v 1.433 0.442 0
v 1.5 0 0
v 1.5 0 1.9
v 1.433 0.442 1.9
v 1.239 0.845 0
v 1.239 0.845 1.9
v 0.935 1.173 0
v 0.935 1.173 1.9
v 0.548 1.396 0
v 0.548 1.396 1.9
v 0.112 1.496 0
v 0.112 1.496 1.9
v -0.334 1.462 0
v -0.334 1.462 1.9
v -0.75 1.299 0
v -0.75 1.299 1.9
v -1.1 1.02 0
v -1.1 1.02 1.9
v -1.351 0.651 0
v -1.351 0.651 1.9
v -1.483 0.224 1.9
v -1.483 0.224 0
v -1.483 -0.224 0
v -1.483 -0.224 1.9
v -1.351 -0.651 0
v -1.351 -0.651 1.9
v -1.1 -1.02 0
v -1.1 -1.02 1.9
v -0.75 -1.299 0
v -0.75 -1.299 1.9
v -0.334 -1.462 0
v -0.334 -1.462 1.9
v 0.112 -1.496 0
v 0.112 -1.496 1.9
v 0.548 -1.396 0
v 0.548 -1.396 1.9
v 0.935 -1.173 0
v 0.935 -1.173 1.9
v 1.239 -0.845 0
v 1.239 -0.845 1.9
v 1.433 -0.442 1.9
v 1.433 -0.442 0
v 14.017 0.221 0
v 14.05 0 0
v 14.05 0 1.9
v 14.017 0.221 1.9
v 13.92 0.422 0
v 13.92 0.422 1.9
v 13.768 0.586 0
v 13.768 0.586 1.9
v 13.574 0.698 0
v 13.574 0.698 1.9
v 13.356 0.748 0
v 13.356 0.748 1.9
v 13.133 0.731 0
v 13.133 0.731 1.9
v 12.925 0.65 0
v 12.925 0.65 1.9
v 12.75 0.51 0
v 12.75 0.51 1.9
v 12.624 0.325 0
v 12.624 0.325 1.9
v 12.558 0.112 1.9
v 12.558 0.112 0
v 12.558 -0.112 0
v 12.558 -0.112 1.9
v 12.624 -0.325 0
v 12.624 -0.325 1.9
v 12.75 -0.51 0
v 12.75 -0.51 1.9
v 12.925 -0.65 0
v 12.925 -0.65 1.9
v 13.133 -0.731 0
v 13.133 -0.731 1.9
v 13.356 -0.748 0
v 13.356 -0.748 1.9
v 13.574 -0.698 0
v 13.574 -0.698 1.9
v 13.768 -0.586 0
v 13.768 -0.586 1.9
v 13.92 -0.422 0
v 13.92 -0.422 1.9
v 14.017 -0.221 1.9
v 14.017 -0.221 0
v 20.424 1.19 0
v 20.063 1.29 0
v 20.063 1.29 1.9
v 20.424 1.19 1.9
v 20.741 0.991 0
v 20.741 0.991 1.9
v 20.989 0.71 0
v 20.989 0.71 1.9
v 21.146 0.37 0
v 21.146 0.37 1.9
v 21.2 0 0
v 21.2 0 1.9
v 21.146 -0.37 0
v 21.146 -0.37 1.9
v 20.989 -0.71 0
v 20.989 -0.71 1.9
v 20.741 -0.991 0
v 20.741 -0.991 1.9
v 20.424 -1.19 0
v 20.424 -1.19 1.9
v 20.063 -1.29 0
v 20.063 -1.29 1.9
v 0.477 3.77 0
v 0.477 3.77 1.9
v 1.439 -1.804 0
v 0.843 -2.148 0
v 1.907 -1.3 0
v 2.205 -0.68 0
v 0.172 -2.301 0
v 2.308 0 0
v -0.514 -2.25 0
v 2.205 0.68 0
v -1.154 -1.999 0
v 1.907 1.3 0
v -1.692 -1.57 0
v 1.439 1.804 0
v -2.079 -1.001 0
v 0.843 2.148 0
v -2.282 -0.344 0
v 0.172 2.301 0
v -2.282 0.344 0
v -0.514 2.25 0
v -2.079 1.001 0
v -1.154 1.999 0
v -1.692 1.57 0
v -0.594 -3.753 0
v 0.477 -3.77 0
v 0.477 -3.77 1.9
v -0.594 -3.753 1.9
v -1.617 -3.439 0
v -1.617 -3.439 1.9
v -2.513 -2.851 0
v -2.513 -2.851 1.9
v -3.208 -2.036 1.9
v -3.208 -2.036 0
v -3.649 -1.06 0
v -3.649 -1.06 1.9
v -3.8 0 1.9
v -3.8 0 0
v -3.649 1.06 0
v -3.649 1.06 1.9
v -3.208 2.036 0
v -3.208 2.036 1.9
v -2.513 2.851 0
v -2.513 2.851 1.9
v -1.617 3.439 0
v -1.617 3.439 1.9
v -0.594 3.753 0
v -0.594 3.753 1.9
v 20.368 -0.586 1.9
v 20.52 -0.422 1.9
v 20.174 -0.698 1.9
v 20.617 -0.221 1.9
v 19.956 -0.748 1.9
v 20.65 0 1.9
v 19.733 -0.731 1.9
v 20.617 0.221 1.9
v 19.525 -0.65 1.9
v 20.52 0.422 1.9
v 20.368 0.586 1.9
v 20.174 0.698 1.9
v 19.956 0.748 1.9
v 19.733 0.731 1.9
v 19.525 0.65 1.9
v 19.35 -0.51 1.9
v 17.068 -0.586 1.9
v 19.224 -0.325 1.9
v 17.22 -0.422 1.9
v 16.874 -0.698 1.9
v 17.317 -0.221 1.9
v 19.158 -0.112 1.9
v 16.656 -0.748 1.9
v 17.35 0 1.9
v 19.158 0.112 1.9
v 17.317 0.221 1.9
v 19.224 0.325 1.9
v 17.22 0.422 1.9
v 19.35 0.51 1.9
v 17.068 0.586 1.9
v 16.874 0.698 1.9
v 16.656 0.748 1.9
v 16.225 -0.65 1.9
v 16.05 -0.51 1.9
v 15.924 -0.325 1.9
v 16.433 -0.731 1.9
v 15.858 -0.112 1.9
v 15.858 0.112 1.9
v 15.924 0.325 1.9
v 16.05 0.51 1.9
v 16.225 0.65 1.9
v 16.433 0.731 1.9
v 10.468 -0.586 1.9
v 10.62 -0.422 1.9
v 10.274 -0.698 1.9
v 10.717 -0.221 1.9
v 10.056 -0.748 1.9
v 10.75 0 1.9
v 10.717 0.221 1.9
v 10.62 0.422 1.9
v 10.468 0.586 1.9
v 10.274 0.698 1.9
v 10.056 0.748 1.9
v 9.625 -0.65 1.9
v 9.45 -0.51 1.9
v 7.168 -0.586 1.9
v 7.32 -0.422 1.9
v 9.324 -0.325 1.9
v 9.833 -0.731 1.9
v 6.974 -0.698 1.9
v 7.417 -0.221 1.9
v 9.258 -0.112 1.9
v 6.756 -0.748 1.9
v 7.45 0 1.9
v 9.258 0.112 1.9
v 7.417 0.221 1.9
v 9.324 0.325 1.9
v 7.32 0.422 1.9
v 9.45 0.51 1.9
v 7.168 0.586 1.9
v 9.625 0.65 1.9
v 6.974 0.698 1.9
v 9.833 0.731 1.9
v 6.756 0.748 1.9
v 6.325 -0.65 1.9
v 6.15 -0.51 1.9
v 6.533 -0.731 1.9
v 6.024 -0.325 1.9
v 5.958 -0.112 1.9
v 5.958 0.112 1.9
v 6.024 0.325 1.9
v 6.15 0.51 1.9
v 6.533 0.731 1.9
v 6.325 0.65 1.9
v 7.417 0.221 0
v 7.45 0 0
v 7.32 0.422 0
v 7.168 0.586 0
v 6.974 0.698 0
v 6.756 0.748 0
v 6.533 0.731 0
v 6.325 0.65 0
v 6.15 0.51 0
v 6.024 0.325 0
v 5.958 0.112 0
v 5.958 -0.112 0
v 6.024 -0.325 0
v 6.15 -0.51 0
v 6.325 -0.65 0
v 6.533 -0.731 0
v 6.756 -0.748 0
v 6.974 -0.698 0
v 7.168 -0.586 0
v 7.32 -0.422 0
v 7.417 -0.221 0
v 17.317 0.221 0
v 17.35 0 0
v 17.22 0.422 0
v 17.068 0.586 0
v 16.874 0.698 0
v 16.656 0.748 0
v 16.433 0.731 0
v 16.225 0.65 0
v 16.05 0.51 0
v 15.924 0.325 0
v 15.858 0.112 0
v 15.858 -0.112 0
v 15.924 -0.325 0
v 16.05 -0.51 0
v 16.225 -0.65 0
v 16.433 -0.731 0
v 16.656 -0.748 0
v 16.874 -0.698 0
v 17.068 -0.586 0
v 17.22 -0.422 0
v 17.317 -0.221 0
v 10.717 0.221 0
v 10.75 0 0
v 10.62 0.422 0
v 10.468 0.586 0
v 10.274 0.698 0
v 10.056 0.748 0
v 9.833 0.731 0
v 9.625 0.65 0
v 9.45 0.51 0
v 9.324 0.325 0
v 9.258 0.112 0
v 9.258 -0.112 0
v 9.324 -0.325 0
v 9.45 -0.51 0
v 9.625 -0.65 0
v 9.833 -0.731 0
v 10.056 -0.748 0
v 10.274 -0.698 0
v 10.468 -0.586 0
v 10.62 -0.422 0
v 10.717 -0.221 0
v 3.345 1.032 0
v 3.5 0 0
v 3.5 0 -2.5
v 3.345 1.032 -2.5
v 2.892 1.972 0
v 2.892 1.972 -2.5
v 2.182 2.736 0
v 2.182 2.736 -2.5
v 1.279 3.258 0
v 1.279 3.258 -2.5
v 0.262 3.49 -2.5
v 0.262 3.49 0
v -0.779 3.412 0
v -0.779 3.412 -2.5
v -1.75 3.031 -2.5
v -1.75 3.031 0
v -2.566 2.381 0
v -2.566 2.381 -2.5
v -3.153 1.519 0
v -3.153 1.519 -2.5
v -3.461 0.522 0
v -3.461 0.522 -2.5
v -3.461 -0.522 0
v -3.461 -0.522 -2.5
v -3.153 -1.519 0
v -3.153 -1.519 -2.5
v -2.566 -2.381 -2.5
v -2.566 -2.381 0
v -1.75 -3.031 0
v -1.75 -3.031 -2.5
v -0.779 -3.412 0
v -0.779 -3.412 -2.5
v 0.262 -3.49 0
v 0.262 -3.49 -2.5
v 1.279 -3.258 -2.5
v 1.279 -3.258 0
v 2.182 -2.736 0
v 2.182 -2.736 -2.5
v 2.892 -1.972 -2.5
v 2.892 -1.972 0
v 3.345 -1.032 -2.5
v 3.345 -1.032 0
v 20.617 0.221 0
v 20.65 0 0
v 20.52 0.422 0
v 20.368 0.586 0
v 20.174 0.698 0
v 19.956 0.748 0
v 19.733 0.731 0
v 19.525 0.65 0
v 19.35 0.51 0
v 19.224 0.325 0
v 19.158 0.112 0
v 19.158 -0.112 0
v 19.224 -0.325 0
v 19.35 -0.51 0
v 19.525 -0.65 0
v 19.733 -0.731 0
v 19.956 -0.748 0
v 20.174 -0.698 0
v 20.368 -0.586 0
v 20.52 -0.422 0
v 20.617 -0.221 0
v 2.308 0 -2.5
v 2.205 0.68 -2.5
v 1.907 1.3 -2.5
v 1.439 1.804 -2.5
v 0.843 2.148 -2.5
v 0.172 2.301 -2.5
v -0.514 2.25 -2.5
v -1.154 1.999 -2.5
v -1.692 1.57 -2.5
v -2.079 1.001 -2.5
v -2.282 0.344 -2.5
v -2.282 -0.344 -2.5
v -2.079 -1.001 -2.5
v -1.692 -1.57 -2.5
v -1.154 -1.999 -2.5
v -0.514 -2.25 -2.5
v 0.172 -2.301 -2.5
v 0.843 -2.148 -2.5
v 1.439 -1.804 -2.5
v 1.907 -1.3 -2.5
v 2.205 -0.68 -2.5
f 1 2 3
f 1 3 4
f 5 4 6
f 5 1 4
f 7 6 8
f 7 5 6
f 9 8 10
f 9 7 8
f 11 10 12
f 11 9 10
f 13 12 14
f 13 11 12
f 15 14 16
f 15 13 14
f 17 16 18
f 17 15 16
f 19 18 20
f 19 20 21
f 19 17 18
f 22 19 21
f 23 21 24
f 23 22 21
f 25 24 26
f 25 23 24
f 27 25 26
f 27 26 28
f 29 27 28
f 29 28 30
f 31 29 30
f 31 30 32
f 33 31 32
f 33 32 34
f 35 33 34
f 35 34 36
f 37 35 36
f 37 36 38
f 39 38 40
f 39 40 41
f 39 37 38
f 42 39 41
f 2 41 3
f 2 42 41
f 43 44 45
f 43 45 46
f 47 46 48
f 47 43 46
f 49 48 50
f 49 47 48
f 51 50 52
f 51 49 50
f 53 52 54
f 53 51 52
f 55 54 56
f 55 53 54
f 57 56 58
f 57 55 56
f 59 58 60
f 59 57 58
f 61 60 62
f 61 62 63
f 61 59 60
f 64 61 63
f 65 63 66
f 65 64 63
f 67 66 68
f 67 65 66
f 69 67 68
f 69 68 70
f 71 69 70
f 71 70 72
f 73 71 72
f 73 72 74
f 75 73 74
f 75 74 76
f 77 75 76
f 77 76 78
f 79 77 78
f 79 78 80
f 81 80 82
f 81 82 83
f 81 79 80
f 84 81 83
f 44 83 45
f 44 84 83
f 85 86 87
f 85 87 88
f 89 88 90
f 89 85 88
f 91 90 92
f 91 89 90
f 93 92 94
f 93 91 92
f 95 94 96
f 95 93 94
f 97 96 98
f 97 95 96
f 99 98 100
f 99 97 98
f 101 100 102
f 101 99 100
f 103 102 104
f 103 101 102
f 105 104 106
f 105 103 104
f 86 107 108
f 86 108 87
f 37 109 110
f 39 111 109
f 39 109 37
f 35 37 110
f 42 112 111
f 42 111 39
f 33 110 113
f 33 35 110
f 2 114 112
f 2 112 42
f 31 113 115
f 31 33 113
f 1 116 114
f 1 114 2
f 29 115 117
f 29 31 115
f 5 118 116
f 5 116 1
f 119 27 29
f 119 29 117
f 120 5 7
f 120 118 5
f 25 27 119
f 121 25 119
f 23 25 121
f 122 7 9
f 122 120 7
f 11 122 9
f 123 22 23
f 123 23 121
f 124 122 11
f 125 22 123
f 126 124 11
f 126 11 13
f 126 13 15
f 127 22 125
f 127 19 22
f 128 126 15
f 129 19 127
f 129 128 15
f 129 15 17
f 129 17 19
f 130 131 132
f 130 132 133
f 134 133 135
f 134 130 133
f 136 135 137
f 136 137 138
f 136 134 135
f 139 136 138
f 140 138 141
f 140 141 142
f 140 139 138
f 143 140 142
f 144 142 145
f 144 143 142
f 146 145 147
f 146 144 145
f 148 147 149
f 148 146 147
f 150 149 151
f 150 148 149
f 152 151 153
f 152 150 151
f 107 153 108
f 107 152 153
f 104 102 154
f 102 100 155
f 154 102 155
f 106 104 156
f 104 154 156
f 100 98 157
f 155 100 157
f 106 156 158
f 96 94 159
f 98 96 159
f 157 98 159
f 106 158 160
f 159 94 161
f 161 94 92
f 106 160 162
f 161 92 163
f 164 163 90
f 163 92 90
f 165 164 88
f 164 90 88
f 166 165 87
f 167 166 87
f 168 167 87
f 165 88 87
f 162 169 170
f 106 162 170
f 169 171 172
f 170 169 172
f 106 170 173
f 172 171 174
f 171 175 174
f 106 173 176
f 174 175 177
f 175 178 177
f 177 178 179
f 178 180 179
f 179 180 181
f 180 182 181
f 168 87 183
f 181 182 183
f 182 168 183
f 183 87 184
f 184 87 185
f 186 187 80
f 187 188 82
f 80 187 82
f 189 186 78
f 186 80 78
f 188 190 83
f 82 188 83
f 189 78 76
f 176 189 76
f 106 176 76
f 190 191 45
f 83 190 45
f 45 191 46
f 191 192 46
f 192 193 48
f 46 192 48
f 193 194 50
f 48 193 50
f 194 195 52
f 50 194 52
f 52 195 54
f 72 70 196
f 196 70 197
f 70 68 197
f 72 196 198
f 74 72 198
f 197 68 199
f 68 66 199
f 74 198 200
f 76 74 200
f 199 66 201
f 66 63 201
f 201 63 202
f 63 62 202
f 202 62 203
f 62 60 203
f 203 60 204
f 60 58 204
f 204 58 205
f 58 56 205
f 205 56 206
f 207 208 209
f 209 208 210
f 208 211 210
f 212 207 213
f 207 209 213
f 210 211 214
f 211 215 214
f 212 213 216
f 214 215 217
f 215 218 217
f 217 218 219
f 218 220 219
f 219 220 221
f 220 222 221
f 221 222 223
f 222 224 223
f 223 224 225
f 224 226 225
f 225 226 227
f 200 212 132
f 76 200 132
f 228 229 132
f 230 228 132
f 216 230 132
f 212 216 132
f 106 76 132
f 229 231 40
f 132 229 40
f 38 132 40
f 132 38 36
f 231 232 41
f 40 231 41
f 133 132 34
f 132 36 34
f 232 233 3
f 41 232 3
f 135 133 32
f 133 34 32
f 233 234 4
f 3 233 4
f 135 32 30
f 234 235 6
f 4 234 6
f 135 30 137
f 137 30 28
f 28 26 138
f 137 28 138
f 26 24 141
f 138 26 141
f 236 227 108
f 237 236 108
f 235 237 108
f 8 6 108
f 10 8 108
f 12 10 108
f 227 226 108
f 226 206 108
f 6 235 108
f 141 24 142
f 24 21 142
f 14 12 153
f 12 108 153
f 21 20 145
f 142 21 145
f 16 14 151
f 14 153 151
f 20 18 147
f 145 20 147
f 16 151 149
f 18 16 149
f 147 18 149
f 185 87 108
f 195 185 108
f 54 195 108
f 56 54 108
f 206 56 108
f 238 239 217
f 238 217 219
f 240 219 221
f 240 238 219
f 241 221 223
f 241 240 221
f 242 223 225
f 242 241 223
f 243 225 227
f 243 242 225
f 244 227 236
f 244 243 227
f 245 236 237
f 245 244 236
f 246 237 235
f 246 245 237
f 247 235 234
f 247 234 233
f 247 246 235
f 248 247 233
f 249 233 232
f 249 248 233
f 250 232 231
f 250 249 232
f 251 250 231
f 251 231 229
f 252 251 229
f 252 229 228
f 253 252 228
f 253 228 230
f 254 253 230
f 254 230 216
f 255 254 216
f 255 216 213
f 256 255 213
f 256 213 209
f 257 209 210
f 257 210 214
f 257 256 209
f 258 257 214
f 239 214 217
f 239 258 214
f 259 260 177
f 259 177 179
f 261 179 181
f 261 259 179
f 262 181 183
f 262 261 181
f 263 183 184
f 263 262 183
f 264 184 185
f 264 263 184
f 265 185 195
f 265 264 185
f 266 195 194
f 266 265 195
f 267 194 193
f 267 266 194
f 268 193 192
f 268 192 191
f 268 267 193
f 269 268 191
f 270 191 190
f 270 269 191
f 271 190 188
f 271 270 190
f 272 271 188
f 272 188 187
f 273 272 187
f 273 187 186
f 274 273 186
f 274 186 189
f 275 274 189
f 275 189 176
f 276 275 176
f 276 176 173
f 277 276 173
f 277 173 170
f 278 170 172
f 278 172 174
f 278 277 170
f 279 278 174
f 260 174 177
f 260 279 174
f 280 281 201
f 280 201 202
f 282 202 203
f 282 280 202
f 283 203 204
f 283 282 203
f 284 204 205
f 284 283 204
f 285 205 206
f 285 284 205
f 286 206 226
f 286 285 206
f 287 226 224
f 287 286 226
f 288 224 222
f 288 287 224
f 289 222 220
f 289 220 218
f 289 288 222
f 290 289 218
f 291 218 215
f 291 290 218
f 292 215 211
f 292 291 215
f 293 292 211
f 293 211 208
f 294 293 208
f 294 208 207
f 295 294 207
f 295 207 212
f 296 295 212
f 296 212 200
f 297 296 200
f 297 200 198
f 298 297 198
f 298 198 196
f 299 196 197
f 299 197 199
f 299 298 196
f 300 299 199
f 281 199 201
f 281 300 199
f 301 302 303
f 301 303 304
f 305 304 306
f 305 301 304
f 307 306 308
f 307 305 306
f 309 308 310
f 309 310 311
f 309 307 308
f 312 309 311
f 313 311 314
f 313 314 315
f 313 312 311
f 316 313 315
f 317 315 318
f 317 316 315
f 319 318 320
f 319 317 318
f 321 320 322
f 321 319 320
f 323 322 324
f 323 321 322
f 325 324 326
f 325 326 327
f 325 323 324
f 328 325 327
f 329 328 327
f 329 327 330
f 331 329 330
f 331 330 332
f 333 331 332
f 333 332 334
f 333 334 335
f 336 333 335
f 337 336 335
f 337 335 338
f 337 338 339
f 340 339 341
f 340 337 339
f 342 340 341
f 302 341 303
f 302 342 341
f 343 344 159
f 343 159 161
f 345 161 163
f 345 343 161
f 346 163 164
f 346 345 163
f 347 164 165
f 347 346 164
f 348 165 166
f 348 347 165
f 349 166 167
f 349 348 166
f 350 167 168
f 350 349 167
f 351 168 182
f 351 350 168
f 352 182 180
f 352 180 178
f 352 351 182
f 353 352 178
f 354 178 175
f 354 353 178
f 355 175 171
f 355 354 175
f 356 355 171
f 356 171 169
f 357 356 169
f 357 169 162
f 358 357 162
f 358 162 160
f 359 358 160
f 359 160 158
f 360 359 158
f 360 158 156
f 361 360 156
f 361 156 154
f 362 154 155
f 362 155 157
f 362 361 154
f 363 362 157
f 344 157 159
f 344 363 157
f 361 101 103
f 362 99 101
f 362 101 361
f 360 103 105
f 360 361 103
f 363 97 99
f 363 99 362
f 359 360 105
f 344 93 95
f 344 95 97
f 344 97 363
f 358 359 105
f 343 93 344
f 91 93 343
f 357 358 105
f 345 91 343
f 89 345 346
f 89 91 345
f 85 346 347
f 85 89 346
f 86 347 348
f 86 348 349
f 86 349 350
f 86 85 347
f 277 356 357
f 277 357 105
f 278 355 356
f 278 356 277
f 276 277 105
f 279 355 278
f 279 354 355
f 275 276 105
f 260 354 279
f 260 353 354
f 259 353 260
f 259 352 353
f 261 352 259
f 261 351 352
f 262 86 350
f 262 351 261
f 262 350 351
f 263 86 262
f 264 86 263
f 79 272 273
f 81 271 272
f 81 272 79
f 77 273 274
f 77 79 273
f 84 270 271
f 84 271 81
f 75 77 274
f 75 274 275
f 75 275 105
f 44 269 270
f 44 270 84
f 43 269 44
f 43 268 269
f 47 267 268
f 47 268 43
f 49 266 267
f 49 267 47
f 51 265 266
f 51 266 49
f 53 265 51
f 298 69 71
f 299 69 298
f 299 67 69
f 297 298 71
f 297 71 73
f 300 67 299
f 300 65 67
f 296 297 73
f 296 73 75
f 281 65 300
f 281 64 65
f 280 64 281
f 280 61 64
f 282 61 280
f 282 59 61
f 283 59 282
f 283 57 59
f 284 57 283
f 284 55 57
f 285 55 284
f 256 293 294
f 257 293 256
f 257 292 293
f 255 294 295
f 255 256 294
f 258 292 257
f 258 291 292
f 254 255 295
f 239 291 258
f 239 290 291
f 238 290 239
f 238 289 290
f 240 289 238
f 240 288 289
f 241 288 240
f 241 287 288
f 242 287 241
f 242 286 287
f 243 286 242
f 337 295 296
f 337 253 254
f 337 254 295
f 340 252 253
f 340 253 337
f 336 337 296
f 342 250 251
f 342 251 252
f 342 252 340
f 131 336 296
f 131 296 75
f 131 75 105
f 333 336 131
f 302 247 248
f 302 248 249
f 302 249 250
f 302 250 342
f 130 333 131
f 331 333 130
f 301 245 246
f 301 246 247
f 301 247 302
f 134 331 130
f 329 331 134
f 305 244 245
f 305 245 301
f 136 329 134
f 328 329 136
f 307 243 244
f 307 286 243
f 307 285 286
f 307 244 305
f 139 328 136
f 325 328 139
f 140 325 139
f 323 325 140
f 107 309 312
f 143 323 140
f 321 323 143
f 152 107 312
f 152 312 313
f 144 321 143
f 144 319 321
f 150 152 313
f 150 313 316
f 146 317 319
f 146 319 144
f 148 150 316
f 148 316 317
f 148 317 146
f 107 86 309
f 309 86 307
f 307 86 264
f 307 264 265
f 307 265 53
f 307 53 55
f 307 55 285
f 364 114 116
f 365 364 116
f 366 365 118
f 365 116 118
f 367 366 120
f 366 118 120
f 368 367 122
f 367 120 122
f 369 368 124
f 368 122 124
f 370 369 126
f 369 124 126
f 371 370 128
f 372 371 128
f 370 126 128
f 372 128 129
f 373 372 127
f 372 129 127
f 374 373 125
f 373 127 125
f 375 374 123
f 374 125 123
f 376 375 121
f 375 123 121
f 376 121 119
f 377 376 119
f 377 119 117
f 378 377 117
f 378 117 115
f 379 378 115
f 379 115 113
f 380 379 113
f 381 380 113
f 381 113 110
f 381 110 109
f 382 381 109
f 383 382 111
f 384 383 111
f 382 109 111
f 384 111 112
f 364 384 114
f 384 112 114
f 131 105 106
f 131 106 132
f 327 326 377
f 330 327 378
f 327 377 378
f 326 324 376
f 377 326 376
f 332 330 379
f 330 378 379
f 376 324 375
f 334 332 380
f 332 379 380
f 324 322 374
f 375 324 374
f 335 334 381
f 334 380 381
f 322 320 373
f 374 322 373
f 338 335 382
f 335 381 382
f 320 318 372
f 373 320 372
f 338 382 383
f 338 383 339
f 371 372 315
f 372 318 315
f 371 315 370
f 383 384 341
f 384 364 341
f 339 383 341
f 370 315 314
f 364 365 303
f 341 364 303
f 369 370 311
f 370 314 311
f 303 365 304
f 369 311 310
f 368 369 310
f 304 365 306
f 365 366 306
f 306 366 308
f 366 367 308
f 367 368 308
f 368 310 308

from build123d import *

# Parameters (mm, degrees)
SCHIZZO2_R                   = 0.75
SCHIZZO2_R_2                 = 1.5
ESTRUSIONE_ESTRUSIONE1_DEPTH = 1.9
SCHIZZO3_R                   = 3.5
SCHIZZO3_R_2                 = 2.307795375
ESTRUSIONE_ESTRUSIONE2_DEPTH = 2.5


with BuildPart() as part:
    # Schizzo2 → Estrusione-Estrusione1 (new body)
    with BuildSketch(Plane.XY):
        with BuildLine():
            Line((0.477386935, 3.769894125), (20.063316583, 1.289700622))
            ThreePointArc((20.063316583, 1.289700622), (21.2, 0), (20.063316583, -1.289700622))
            Line((20.063316583, -1.289700622), (0.477386935, -3.769894125))
            ThreePointArc((0.477386935, -3.769894125), (-3.8, 0), (0.477386935, 3.769894125))
        make_face()
        with Locations((19.9, 0)):
            Circle(SCHIZZO2_R, mode=Mode.SUBTRACT)
        with Locations((6.7, 0)):
            Circle(SCHIZZO2_R, mode=Mode.SUBTRACT)
        with Locations((10, 0)):
            Circle(SCHIZZO2_R, mode=Mode.SUBTRACT)
        with Locations((13.3, 0)):
            Circle(SCHIZZO2_R, mode=Mode.SUBTRACT)
        with Locations((16.6, 0)):
            Circle(SCHIZZO2_R, mode=Mode.SUBTRACT)
        Circle(SCHIZZO2_R_2, mode=Mode.SUBTRACT)
    extrude(amount=ESTRUSIONE_ESTRUSIONE1_DEPTH)

    # Schizzo3 → Estrusione-Estrusione2 (add)
    with BuildSketch(Plane.XY):
        Circle(SCHIZZO3_R)
        Circle(SCHIZZO3_R_2, mode=Mode.SUBTRACT)
    extrude(amount=-ESTRUSIONE_ESTRUSIONE2_DEPTH)


solid = part.part
